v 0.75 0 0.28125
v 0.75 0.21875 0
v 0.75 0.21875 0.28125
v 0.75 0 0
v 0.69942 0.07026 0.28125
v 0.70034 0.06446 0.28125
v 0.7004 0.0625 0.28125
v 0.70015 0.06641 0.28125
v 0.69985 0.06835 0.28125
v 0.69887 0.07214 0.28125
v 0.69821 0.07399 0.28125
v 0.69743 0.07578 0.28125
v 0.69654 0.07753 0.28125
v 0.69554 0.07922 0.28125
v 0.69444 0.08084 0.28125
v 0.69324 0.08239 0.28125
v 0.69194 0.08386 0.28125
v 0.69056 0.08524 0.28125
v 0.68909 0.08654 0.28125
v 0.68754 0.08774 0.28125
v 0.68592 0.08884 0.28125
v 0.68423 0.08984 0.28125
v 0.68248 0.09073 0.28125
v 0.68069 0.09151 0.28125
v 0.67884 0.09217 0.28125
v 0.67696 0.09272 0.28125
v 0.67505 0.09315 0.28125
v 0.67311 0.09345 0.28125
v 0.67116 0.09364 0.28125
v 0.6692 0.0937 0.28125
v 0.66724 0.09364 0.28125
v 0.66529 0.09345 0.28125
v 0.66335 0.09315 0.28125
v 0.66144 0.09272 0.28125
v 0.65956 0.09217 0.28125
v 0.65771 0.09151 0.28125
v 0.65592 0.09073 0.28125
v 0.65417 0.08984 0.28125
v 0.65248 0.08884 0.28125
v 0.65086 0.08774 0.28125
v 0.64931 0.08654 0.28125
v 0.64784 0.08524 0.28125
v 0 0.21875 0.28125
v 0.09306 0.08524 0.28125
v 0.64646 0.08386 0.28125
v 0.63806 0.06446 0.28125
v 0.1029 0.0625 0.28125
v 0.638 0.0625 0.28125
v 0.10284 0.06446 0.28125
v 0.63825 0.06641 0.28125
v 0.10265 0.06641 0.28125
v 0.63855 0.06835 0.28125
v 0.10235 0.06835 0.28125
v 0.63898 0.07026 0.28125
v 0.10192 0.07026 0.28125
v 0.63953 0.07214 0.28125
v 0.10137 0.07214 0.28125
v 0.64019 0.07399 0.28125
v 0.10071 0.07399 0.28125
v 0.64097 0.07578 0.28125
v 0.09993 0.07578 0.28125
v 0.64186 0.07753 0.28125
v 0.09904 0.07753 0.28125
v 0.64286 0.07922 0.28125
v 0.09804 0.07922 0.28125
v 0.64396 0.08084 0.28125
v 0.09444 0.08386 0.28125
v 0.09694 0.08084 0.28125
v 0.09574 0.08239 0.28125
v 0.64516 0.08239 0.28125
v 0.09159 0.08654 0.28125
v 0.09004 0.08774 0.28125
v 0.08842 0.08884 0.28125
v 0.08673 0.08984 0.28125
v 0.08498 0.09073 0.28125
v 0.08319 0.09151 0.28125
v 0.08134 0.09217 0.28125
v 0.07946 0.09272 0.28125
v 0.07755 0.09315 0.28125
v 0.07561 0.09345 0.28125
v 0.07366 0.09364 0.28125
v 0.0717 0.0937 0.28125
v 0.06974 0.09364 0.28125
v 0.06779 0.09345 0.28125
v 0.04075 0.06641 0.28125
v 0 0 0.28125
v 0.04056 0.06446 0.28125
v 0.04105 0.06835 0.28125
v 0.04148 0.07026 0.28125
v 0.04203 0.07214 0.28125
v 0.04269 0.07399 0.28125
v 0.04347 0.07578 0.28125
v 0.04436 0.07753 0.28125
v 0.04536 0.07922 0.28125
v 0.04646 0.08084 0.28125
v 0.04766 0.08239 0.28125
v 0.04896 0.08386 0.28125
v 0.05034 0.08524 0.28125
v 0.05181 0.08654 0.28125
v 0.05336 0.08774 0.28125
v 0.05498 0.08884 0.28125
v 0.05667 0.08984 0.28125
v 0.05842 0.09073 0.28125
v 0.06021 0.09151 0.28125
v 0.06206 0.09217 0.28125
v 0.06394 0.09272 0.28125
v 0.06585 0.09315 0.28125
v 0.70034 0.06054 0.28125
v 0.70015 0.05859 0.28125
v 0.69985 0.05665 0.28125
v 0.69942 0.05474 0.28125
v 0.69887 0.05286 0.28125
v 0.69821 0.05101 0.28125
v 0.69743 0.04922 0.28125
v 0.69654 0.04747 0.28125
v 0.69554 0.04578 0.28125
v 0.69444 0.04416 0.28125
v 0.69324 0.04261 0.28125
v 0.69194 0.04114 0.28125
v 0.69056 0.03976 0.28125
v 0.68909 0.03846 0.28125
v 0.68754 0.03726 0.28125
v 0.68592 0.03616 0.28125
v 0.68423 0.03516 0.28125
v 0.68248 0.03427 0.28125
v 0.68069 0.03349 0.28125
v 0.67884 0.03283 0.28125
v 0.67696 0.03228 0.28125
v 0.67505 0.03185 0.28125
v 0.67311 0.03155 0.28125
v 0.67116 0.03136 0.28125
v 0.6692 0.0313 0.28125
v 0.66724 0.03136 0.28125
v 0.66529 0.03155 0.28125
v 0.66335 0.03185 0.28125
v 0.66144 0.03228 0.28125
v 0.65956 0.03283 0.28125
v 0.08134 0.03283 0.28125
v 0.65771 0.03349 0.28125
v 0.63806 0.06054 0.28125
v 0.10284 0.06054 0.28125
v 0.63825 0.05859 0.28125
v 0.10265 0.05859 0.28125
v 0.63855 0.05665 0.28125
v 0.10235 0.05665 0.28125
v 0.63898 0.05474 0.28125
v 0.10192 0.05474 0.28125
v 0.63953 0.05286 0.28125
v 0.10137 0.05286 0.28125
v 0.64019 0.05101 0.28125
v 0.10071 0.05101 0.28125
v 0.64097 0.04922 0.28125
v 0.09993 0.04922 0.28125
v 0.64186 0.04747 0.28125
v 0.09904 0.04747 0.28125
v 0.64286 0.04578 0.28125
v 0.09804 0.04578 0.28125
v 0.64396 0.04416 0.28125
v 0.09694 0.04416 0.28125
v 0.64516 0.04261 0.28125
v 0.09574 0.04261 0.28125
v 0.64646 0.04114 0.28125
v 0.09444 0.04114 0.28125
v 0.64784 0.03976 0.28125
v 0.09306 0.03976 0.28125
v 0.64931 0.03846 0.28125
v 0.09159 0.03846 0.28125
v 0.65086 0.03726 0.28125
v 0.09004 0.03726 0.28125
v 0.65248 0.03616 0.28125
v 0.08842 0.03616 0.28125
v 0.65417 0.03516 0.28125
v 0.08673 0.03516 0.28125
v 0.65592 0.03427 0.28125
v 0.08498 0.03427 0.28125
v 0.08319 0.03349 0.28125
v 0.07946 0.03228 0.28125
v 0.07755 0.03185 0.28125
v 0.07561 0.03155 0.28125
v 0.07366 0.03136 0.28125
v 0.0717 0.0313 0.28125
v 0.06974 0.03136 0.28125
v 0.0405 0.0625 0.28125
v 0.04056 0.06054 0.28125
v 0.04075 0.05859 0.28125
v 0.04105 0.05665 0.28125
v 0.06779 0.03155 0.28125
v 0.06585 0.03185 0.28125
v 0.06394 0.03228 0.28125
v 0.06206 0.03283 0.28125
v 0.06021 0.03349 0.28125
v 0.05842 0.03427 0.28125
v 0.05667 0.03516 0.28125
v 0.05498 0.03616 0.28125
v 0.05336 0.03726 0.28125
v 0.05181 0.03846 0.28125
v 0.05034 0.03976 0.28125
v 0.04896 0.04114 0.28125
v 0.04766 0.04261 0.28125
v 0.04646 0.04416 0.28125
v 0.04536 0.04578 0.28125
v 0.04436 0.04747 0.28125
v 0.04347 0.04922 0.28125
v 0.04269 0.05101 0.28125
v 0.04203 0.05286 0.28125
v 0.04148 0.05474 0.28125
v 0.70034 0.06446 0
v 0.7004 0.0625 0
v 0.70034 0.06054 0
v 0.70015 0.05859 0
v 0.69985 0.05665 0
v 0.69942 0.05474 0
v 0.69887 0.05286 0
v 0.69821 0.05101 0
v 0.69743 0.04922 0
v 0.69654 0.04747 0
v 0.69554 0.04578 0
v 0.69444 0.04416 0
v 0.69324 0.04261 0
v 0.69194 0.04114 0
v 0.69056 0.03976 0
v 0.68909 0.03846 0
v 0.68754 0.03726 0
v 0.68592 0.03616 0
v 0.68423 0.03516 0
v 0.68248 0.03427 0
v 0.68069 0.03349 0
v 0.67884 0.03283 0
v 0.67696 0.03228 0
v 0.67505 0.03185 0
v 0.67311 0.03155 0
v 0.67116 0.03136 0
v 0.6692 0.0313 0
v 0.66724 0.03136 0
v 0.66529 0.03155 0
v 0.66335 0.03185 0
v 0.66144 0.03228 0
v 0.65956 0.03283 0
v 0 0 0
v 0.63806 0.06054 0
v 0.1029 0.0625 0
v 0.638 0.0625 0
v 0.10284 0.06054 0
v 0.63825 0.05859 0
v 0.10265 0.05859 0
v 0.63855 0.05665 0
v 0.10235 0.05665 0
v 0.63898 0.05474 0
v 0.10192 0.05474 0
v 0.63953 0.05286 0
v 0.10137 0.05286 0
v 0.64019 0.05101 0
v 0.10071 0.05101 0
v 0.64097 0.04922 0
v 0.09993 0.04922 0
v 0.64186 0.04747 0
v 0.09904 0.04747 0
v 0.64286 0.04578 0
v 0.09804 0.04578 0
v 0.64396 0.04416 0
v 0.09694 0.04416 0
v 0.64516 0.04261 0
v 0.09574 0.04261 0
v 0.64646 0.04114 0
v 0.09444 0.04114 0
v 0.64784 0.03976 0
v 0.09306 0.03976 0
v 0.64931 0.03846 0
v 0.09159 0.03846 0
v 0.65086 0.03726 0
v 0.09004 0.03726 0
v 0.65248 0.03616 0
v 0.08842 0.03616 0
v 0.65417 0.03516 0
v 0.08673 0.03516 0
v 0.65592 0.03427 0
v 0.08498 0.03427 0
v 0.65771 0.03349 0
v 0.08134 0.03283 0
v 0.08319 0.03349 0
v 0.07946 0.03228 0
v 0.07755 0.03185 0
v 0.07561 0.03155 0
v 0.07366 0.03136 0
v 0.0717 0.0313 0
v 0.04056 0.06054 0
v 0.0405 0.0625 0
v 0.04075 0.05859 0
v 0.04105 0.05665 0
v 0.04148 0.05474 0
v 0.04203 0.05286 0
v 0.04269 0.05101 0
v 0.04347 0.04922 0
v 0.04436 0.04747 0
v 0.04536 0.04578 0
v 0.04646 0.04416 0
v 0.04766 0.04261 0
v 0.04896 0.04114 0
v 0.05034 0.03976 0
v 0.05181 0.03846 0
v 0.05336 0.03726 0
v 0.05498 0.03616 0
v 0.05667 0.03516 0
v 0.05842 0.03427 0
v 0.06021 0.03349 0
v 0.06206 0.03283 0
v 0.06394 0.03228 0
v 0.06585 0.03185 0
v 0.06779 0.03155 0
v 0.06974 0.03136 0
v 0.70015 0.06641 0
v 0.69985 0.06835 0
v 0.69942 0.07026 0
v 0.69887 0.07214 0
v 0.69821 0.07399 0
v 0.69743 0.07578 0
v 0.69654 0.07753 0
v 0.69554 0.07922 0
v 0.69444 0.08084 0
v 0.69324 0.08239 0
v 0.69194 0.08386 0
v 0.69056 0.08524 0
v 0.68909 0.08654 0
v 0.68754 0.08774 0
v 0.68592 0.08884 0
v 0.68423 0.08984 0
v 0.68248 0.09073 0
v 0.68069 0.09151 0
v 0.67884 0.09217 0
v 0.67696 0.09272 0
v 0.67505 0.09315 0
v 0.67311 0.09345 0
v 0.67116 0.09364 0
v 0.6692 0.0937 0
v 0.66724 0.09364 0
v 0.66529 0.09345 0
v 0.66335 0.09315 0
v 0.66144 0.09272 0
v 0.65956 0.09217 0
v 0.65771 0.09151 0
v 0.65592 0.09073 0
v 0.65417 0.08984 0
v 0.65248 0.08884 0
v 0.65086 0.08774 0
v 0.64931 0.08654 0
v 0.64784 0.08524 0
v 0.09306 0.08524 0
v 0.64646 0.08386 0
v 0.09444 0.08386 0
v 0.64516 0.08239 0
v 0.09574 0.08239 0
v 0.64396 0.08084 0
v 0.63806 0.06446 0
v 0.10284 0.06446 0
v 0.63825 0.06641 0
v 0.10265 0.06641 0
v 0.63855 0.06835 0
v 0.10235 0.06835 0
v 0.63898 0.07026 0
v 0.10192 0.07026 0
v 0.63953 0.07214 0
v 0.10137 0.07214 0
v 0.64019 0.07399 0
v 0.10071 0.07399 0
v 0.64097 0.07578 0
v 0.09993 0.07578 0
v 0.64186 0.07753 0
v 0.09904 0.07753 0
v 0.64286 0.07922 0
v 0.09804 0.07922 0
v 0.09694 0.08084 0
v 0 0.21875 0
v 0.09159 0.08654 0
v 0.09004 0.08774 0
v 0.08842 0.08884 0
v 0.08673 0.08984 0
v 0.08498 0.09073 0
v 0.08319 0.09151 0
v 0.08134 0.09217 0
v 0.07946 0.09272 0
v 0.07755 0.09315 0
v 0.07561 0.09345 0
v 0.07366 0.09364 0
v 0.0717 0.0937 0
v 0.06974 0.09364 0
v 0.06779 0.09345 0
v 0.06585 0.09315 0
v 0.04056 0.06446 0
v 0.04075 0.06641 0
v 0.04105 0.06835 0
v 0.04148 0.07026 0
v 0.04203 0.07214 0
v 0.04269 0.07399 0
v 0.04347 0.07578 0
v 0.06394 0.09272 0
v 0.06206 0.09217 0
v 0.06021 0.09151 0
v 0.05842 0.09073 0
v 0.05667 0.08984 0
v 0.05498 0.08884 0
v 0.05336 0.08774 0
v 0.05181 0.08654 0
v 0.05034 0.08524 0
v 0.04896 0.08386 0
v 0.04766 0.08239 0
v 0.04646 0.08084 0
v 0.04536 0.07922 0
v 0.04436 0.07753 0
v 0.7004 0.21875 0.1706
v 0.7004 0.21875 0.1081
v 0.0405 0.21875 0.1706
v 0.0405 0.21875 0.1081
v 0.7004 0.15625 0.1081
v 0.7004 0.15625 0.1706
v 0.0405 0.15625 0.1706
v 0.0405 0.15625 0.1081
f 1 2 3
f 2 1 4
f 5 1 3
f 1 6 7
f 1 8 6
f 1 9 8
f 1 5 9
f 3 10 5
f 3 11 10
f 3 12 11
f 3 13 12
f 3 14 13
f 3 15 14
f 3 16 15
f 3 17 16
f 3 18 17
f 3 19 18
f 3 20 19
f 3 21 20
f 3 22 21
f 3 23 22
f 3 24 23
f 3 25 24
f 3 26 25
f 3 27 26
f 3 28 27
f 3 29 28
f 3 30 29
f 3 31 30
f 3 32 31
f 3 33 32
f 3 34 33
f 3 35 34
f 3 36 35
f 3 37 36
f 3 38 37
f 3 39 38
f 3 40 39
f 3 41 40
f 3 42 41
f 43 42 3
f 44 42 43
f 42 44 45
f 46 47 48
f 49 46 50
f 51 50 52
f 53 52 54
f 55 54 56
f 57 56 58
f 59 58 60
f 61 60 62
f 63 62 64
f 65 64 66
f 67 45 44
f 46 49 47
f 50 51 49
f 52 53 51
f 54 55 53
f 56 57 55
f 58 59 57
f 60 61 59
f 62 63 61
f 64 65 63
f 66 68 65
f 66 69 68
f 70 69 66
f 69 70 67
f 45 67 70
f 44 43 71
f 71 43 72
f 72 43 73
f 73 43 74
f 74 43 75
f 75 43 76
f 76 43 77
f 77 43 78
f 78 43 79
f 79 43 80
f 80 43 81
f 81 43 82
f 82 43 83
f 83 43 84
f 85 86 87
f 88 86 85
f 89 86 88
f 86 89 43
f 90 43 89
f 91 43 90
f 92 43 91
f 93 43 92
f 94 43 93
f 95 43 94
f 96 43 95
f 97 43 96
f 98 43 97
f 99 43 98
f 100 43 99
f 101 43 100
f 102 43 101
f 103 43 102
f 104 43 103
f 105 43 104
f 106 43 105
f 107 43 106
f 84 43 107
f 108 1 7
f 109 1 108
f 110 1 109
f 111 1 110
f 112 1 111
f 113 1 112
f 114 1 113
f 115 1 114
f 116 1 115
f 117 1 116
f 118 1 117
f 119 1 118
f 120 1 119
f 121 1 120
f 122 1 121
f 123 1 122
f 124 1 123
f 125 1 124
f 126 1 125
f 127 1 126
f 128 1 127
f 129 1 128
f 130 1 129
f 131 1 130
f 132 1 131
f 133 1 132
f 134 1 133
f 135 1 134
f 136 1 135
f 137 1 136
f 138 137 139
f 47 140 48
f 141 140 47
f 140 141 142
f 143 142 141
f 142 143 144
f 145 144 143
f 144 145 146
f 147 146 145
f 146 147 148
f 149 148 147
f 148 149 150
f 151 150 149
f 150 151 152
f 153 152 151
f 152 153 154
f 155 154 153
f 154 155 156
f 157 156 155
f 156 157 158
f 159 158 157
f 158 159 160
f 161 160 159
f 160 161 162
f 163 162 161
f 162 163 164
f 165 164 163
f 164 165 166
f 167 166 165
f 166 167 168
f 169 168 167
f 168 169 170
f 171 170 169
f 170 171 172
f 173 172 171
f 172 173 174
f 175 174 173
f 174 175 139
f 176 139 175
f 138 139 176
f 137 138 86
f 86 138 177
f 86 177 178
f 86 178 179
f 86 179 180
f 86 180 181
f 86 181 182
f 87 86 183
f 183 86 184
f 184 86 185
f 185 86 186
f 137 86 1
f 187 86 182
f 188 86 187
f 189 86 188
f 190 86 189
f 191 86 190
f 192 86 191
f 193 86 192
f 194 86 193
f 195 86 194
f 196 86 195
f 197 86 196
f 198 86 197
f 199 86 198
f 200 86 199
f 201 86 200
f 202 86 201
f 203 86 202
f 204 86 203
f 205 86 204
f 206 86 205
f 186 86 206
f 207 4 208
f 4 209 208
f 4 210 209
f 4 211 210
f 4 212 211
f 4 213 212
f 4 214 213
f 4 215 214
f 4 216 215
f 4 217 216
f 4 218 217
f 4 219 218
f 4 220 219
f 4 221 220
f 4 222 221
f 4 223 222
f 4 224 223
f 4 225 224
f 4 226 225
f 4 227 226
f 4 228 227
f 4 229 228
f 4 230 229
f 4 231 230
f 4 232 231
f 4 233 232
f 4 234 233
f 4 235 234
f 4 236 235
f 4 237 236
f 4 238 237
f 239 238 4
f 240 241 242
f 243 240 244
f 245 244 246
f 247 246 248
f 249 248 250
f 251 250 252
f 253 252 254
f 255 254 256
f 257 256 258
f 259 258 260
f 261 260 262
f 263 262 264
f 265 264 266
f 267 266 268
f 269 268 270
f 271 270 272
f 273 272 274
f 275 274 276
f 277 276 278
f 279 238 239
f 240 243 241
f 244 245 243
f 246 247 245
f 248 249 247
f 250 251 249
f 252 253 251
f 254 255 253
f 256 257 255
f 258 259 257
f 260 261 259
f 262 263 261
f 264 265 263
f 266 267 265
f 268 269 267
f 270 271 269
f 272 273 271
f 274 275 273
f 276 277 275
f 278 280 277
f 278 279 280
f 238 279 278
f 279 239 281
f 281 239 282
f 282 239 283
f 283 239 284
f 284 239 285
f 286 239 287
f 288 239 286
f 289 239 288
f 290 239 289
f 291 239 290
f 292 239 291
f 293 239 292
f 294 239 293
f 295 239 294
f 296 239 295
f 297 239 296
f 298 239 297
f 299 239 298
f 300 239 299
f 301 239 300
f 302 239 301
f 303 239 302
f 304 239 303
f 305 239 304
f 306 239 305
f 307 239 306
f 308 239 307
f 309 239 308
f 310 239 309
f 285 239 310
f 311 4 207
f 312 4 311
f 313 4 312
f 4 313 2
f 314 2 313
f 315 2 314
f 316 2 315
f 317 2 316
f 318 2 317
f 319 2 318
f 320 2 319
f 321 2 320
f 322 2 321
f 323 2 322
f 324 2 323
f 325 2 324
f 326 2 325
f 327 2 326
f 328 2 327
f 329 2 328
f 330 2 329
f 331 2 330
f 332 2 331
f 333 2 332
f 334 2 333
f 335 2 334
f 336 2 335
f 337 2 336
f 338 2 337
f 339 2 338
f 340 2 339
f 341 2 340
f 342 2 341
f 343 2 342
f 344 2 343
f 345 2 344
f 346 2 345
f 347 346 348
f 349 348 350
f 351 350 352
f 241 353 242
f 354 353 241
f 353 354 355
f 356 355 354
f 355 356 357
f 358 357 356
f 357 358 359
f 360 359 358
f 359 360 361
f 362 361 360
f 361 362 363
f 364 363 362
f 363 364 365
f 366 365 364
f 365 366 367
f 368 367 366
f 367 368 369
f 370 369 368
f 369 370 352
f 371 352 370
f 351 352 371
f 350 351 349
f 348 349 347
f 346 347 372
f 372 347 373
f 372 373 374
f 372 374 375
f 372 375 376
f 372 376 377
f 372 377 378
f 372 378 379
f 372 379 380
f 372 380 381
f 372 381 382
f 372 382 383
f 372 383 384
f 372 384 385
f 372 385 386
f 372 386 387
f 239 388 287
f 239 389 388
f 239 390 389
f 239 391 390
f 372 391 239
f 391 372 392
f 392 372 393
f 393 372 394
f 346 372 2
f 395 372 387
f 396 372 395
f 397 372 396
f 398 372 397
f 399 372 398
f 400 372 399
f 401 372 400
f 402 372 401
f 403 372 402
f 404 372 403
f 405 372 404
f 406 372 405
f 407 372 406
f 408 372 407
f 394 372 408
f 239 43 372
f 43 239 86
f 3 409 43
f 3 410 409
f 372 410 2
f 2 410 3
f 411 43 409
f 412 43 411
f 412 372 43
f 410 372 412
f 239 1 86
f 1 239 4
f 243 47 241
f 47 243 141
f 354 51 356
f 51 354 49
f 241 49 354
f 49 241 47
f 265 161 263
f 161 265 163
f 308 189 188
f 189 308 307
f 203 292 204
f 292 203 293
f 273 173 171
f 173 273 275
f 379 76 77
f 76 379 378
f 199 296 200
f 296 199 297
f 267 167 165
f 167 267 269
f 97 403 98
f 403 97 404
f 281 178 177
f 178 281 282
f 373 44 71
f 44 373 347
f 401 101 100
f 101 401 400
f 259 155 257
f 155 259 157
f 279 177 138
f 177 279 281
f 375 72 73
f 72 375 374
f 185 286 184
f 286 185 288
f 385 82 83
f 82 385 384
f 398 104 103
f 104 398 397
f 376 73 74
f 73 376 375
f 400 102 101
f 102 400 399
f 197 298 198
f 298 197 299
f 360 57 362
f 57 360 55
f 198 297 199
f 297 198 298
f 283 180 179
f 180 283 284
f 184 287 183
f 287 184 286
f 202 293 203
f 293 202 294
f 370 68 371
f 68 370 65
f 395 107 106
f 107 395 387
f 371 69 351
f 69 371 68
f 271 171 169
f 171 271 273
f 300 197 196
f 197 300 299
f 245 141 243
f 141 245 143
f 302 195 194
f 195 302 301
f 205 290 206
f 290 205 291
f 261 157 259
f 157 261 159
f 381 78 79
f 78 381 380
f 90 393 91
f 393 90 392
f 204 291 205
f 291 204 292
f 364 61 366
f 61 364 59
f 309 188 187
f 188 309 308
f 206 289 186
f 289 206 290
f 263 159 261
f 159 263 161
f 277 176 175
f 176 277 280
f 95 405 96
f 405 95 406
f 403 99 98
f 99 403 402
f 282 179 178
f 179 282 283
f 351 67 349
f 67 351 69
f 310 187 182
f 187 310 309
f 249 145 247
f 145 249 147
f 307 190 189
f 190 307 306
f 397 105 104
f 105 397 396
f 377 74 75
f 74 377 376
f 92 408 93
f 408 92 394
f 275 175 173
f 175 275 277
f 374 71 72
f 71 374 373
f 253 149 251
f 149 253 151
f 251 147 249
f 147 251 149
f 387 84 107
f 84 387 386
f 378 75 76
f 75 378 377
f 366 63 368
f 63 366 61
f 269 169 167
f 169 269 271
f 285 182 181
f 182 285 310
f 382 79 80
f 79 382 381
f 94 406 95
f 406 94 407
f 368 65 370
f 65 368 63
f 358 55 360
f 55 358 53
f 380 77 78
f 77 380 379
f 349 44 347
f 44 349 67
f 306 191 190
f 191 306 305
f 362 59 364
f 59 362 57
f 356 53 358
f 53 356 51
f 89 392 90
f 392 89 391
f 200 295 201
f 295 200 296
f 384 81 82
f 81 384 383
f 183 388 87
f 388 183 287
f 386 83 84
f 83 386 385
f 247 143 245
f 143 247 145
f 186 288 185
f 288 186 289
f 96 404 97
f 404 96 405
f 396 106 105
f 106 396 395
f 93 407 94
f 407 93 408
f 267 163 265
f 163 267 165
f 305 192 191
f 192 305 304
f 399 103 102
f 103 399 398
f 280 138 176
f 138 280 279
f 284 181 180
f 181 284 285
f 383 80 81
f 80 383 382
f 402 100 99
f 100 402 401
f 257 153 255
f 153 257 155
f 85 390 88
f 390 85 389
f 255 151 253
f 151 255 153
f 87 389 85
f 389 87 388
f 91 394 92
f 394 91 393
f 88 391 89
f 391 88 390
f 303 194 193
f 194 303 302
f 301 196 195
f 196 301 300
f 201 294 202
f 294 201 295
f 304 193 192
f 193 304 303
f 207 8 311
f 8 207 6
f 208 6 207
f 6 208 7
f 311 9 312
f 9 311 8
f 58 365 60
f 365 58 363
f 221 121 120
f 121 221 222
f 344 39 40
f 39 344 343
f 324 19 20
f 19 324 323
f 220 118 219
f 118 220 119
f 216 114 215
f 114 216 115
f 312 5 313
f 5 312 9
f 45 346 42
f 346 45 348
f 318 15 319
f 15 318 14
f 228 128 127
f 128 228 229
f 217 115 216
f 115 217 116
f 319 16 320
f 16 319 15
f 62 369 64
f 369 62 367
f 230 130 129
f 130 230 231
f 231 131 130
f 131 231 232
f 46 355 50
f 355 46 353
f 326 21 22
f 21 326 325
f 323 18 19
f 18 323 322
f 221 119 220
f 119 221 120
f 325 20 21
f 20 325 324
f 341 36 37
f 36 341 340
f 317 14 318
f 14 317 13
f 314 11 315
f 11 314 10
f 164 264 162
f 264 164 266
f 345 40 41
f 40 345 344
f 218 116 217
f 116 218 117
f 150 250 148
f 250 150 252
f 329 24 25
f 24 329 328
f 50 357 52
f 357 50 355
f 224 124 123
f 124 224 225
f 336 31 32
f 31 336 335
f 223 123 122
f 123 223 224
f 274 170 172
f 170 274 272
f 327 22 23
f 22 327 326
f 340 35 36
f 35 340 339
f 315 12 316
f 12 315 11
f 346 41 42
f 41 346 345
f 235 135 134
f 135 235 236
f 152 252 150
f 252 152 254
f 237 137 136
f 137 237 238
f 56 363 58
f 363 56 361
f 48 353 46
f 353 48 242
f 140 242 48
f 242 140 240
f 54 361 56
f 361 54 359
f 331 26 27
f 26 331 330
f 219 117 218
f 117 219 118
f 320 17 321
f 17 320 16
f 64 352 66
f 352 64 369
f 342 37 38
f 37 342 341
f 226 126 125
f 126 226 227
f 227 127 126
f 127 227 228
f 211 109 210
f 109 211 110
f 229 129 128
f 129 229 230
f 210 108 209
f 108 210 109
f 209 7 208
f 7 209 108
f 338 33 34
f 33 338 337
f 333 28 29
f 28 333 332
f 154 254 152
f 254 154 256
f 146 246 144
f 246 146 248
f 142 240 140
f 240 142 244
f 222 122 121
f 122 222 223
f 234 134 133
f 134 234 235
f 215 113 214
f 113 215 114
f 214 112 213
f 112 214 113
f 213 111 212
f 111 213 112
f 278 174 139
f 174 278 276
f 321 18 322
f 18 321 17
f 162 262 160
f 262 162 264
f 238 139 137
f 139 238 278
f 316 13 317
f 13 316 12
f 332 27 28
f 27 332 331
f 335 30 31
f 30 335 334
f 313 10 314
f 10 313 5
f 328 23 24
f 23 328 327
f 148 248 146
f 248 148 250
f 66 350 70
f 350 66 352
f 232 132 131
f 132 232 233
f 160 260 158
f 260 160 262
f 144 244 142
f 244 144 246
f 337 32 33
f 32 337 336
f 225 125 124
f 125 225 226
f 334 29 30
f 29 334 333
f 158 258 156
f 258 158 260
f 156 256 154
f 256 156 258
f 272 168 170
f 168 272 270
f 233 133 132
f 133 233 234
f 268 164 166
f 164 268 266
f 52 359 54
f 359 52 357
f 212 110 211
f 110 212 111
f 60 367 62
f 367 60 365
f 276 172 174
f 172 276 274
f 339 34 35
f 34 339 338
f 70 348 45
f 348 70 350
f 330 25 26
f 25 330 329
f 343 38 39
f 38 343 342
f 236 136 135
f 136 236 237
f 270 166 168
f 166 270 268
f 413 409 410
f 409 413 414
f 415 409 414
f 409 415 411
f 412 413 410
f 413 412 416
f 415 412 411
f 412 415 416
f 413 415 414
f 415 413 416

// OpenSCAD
// Parametric design for base with two circular holes and a front band pocket

// Base dimensions
length = 0.75;
width = 0.21875;
height = 0.28125;
extrusion_depth = 0.2812; // main extrusion depth (same as height)

// Hole parameters
hole_radius = 0.0312;
hole1_x = 0.0717;
hole1_y = 0.0625;
hole2_x = 0.6692;
hole2_y = 0.0625;

// Band (pocket) parameters
band_length = 0.6599; // envelope length of the two holes
band_height = 0.0625; // vertical height of the band
band_depth = 0.0625;  // cut depth into the base from the front
band_z_start = 0.1081; // band start height above base underside
band_z_end = 0.1705;   // band end height above base underside

// Derived band position
band_x_center = (hole1_x + hole2_x) / 2; // center between holes
band_y = width; // front face (y = width)
band_z = band_z_start;

// Resolution for smooth circles
$fn = 100;

// Module for creating a through hole (cylinder along z-axis)
module through_hole(x, y, r) {
    translate([x, y, -0.001]) // slight offset to ensure clean cut
        cylinder(h = height + 0.002, r = r, center = false);
}

// Module for creating the front band pocket
module front_band(x_center, y, z, len, h, depth) {
    translate([x_center - len/2, y - depth, z])
        cube([len, depth, h]);
}

// Main model: base with holes and band pocket
difference() {
    // Solid base block
    cube([length, width, height]);
    
    // Subtract two through holes
    through_hole(hole1_x, hole1_y, hole_radius);
    through_hole(hole2_x, hole2_y, hole_radius);
    
    // Subtract front band pocket
    front_band(band_x_center, band_y, band_z, band_length, band_height, band_depth);
}
